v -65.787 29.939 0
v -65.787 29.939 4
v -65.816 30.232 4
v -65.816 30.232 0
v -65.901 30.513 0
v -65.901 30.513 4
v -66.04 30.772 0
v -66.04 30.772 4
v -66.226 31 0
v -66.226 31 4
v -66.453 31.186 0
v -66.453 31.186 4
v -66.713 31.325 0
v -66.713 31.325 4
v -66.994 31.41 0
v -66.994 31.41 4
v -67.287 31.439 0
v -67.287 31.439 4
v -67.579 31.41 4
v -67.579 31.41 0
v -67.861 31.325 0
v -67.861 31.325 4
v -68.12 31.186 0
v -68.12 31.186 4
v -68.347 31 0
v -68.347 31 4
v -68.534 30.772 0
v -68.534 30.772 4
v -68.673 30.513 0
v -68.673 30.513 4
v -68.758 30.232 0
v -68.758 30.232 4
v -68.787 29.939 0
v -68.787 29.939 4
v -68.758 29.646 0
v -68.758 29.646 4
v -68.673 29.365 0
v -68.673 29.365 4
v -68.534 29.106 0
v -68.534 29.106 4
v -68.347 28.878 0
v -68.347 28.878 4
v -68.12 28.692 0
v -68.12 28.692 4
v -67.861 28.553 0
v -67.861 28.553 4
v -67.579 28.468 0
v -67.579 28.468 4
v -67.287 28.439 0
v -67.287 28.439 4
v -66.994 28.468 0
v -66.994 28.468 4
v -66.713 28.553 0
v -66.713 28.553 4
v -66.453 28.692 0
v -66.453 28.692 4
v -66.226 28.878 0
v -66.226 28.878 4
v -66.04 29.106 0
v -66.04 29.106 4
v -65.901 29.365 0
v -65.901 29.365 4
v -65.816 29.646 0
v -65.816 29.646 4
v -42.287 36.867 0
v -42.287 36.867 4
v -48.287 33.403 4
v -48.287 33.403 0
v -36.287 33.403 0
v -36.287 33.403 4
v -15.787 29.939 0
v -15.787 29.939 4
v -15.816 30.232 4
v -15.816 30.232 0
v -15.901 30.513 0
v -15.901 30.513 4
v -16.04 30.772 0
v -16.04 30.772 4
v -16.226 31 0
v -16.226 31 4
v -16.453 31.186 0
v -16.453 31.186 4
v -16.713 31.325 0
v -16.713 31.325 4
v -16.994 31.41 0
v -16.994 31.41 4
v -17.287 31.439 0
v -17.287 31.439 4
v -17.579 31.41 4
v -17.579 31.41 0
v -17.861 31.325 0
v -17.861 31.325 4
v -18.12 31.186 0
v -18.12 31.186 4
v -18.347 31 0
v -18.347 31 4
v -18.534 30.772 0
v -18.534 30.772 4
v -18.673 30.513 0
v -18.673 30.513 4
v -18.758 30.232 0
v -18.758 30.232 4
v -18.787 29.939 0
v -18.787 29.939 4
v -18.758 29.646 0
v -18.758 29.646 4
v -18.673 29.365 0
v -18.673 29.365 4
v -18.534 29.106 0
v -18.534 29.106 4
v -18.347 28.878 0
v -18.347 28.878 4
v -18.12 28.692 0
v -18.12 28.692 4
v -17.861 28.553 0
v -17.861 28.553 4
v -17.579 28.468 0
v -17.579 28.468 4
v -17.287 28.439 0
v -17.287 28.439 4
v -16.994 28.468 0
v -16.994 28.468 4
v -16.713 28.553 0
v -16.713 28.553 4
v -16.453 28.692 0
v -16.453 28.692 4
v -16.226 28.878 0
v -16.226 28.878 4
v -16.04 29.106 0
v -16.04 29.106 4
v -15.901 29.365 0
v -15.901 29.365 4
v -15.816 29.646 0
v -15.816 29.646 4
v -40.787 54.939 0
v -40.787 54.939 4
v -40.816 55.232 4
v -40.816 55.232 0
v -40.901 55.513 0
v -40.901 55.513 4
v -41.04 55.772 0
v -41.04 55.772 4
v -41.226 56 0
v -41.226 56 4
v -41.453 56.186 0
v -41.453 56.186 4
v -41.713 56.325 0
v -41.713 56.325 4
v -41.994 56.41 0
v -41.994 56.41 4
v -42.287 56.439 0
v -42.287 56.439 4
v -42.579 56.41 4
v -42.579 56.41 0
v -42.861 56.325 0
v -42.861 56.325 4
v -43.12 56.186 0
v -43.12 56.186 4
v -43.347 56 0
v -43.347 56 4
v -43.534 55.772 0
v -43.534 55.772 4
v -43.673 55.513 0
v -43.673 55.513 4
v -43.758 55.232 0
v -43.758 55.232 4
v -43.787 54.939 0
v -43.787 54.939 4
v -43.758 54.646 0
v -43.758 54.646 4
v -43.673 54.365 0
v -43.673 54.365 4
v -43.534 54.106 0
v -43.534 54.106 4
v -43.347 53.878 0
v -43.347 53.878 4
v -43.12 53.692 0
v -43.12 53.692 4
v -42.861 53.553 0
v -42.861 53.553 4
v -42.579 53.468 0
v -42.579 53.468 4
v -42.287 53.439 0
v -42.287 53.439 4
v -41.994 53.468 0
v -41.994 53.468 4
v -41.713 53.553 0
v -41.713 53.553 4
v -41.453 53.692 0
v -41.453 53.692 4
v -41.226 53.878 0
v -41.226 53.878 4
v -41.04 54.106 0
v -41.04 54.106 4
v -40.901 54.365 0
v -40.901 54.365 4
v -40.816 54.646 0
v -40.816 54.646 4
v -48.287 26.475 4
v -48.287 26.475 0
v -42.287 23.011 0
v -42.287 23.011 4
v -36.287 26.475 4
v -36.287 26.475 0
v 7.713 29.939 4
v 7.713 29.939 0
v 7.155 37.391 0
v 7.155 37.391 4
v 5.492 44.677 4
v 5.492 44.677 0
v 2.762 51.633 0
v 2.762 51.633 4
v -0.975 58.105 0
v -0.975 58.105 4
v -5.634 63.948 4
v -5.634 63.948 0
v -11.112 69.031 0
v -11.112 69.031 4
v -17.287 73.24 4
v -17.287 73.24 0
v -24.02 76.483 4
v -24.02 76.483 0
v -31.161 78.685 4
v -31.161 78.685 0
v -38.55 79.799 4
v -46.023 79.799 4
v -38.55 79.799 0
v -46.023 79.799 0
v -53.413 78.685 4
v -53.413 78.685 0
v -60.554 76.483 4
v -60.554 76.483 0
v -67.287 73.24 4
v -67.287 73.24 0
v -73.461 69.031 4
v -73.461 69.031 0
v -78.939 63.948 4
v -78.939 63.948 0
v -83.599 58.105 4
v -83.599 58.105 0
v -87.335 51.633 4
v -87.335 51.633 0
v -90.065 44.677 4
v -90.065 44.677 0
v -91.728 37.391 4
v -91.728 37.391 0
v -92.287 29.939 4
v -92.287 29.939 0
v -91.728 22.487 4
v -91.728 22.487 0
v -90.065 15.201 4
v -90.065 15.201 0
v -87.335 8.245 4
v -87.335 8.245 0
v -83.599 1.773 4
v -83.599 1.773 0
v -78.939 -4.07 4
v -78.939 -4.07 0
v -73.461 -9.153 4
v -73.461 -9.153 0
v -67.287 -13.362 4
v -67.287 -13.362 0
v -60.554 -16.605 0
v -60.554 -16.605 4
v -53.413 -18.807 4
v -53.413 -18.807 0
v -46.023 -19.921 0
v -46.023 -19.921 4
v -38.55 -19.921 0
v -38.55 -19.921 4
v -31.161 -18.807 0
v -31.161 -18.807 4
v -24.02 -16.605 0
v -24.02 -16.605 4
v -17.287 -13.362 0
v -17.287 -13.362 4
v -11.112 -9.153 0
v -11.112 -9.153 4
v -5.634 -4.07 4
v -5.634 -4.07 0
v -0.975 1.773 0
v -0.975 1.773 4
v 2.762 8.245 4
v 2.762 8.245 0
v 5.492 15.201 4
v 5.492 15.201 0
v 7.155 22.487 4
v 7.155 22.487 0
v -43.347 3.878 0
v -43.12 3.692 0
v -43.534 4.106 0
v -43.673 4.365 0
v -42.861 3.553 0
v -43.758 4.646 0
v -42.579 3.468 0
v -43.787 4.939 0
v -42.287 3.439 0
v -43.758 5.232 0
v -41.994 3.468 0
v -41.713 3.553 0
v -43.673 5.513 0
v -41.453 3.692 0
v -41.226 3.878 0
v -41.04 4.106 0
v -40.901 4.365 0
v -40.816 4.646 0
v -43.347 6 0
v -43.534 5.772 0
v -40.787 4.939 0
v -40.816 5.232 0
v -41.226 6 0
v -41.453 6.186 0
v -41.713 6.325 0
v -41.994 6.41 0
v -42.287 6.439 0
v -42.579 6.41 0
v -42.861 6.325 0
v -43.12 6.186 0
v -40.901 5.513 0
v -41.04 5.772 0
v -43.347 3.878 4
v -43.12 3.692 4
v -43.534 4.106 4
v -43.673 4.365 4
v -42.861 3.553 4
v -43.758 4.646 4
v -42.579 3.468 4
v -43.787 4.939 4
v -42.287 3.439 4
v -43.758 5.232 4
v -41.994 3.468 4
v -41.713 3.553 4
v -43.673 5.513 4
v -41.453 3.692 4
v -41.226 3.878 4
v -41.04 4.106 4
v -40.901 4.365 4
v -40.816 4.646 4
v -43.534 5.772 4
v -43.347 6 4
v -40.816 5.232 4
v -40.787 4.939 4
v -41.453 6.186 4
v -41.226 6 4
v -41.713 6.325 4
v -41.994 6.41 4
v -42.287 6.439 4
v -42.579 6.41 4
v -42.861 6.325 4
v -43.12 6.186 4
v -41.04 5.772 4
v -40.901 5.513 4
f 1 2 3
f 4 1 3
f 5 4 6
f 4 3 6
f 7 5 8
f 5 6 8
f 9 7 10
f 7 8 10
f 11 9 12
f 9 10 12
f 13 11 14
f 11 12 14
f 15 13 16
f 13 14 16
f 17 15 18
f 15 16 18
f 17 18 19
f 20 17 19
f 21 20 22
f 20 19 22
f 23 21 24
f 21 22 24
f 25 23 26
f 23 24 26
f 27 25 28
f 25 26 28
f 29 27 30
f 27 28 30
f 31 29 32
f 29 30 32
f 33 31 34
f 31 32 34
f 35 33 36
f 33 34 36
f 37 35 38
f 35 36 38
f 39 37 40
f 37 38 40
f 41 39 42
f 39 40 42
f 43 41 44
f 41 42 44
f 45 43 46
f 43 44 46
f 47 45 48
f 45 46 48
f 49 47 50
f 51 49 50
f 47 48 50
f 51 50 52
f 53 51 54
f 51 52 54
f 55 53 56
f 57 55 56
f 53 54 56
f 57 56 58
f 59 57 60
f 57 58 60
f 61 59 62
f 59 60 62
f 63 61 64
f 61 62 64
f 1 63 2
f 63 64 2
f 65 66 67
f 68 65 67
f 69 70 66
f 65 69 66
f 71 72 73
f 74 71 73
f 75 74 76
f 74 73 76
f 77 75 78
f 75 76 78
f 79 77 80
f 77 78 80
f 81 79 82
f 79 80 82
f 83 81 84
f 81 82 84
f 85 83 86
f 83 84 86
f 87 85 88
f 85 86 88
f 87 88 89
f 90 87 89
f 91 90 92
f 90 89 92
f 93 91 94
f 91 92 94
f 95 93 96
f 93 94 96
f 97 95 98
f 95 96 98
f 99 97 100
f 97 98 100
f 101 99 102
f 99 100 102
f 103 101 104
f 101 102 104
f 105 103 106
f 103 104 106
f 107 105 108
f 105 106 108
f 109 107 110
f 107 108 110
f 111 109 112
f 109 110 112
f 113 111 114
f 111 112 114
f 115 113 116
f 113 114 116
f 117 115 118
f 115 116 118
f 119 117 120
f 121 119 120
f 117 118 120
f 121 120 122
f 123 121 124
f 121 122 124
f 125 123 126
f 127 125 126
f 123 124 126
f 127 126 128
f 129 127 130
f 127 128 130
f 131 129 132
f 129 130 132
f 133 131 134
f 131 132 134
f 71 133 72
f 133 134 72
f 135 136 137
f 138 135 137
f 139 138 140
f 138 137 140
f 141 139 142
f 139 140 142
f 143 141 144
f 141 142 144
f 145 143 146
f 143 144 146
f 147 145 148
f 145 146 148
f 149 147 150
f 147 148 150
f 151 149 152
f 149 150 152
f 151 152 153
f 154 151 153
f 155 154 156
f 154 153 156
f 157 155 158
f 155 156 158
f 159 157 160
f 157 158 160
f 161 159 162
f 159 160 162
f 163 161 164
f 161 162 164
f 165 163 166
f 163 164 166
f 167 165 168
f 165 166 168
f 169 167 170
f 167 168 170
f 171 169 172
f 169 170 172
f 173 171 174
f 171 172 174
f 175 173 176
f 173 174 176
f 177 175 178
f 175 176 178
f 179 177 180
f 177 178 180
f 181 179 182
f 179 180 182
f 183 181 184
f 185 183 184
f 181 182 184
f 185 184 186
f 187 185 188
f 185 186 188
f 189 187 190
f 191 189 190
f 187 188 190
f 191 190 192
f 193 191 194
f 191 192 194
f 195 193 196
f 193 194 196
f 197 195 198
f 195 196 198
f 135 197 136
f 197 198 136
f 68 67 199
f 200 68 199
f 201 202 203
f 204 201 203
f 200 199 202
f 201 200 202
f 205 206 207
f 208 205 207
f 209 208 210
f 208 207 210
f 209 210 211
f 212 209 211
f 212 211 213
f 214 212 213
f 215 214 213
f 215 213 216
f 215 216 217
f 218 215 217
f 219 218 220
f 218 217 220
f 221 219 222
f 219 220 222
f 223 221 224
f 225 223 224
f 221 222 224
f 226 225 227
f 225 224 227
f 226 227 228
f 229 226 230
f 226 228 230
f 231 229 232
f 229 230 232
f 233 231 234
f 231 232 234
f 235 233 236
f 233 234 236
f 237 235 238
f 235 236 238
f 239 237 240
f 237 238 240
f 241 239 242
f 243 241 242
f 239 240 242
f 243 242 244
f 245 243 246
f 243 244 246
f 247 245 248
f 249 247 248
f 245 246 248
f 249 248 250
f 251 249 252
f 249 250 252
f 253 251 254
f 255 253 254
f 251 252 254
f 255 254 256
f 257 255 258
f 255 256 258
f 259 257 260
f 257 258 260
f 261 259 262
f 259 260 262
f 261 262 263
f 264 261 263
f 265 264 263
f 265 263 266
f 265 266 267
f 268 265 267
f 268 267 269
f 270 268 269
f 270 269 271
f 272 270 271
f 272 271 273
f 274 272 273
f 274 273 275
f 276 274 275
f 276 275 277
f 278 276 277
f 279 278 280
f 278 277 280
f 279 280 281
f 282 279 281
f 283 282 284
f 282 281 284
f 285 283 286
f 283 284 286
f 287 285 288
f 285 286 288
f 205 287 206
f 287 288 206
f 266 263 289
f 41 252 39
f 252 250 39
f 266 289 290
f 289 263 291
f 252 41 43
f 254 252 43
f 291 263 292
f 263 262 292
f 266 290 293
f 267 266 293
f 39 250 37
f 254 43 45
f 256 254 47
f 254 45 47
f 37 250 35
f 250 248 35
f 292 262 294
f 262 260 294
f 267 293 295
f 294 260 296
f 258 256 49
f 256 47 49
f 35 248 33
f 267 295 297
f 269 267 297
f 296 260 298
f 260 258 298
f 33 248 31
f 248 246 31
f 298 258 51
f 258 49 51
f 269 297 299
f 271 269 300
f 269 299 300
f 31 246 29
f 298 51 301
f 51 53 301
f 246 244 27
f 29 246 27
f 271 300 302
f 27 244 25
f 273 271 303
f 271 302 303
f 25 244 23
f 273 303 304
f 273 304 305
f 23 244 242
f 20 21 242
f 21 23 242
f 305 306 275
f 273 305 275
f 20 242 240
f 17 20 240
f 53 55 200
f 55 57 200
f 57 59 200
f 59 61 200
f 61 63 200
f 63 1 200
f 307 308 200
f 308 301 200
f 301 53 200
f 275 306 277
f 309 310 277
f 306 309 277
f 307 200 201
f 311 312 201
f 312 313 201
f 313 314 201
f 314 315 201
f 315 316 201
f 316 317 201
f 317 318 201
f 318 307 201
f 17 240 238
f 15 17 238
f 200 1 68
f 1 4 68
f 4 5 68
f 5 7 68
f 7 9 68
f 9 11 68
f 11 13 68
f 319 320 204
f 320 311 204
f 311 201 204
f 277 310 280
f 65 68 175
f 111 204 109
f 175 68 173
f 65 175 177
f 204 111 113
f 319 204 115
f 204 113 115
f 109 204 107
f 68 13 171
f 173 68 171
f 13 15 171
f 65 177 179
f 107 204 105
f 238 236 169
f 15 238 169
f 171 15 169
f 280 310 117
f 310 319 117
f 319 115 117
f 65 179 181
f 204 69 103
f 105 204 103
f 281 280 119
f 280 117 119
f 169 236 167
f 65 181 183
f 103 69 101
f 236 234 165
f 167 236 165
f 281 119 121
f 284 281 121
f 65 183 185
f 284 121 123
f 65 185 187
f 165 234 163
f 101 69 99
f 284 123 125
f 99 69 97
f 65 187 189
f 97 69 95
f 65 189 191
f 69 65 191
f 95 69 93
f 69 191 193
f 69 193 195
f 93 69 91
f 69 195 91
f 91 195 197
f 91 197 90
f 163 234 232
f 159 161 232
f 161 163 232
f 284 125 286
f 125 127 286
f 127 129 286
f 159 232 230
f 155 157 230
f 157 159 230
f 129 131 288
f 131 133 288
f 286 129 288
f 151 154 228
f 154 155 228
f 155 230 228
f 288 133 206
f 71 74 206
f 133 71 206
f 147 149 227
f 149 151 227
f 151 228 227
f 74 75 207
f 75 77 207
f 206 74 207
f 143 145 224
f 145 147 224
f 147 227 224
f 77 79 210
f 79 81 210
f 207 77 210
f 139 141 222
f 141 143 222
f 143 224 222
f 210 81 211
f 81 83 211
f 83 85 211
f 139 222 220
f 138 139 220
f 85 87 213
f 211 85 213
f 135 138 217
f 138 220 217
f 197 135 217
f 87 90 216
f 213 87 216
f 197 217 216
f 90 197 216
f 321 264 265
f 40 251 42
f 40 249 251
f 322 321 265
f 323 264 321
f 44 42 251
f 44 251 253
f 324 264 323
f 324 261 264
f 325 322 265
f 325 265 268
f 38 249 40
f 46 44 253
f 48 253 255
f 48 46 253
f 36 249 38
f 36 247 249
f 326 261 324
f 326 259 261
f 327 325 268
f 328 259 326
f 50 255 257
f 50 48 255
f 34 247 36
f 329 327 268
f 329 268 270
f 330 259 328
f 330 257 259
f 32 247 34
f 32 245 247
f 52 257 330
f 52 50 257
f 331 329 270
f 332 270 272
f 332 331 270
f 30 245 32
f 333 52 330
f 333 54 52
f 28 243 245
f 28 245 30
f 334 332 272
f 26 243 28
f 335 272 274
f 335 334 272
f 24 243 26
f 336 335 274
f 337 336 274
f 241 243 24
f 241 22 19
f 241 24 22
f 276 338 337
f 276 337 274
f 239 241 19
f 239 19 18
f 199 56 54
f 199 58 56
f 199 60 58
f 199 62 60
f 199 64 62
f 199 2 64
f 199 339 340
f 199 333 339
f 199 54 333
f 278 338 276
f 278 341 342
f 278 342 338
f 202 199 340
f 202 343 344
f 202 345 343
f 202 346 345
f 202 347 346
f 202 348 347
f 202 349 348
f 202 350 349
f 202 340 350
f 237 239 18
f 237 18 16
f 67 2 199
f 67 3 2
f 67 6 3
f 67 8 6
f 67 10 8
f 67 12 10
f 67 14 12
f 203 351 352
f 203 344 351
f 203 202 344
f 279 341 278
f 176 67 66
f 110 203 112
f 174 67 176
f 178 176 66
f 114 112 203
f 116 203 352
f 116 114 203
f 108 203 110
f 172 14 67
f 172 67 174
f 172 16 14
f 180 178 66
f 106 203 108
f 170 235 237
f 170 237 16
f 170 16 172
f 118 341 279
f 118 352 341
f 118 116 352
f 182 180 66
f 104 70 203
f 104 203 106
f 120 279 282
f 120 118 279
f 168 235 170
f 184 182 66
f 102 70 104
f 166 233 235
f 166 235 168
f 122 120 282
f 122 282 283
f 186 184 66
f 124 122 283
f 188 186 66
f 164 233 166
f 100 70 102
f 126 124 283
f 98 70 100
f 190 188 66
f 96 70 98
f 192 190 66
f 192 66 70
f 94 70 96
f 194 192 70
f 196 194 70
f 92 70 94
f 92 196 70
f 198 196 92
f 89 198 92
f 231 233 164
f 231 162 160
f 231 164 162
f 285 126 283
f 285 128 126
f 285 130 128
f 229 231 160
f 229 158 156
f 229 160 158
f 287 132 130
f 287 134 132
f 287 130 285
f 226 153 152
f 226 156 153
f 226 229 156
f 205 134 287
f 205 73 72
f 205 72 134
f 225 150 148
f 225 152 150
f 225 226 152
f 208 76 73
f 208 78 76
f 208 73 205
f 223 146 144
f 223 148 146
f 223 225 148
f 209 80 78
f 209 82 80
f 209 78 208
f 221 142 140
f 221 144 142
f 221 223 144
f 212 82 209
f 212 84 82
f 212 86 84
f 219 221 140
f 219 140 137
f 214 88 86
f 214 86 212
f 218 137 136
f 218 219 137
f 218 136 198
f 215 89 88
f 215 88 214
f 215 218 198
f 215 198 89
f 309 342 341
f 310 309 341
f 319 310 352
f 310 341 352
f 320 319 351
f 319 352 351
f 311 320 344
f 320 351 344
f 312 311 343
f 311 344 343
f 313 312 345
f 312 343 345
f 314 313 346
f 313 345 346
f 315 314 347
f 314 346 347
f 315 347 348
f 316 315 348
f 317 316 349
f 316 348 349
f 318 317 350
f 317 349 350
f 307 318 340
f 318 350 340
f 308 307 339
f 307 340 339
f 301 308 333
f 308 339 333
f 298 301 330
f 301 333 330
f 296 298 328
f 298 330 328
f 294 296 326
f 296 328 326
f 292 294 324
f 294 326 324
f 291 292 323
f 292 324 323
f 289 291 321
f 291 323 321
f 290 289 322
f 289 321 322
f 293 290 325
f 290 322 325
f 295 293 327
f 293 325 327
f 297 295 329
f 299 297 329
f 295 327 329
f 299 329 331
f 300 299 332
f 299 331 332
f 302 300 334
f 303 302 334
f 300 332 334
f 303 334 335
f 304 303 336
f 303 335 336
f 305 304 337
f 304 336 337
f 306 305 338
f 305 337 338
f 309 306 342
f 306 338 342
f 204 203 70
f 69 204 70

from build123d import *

# Parameters (mm, degrees)
SKETCH1_R           = 50
BOSS_EXTRUDE1_DEPTH = 4
CUT_EXTRUDE1_DEPTH  = 12
SKETCH5_R           = 1.5
CUT_EXTRUDE2_DEPTH  = 4


with BuildPart() as part:
    # Sketch1 → Boss-Extrude1 (new body)
    with BuildSketch(Plane.XY):
        with Locations((-42.286719292, 29.938997259)):
            Circle(SKETCH1_R)
    extrude(amount=BOSS_EXTRUDE1_DEPTH)

    # Sketch4 → Cut-Extrude1 (cut)
    with BuildSketch(Plane.XY.offset(4)):
        Polygon((-42.286719292, 23.010794029), (-36.286719292, 26.474895644), (-36.286719292, 33.403098874), (-42.286719292, 36.867200489), (-48.286719292, 33.403098874), (-48.286719292, 26.474895644), align=None)
    extrude(amount=-CUT_EXTRUDE1_DEPTH, mode=Mode.SUBTRACT)

    # Sketch5 → Cut-Extrude2 (cut)
    with BuildSketch(Plane.XY.offset(4)):
        with Locations((-67.286719292, 29.938997259)):
            Circle(SKETCH5_R)
        with Locations((-42.286719292, 54.938997259)):
            Circle(SKETCH5_R)
        with Locations((-17.286719292, 29.938997259)):
            Circle(SKETCH5_R)
        with Locations((-42.286719292, 4.938997259)):
            Circle(SKETCH5_R)
    extrude(amount=-CUT_EXTRUDE2_DEPTH, mode=Mode.SUBTRACT)


solid = part.part
